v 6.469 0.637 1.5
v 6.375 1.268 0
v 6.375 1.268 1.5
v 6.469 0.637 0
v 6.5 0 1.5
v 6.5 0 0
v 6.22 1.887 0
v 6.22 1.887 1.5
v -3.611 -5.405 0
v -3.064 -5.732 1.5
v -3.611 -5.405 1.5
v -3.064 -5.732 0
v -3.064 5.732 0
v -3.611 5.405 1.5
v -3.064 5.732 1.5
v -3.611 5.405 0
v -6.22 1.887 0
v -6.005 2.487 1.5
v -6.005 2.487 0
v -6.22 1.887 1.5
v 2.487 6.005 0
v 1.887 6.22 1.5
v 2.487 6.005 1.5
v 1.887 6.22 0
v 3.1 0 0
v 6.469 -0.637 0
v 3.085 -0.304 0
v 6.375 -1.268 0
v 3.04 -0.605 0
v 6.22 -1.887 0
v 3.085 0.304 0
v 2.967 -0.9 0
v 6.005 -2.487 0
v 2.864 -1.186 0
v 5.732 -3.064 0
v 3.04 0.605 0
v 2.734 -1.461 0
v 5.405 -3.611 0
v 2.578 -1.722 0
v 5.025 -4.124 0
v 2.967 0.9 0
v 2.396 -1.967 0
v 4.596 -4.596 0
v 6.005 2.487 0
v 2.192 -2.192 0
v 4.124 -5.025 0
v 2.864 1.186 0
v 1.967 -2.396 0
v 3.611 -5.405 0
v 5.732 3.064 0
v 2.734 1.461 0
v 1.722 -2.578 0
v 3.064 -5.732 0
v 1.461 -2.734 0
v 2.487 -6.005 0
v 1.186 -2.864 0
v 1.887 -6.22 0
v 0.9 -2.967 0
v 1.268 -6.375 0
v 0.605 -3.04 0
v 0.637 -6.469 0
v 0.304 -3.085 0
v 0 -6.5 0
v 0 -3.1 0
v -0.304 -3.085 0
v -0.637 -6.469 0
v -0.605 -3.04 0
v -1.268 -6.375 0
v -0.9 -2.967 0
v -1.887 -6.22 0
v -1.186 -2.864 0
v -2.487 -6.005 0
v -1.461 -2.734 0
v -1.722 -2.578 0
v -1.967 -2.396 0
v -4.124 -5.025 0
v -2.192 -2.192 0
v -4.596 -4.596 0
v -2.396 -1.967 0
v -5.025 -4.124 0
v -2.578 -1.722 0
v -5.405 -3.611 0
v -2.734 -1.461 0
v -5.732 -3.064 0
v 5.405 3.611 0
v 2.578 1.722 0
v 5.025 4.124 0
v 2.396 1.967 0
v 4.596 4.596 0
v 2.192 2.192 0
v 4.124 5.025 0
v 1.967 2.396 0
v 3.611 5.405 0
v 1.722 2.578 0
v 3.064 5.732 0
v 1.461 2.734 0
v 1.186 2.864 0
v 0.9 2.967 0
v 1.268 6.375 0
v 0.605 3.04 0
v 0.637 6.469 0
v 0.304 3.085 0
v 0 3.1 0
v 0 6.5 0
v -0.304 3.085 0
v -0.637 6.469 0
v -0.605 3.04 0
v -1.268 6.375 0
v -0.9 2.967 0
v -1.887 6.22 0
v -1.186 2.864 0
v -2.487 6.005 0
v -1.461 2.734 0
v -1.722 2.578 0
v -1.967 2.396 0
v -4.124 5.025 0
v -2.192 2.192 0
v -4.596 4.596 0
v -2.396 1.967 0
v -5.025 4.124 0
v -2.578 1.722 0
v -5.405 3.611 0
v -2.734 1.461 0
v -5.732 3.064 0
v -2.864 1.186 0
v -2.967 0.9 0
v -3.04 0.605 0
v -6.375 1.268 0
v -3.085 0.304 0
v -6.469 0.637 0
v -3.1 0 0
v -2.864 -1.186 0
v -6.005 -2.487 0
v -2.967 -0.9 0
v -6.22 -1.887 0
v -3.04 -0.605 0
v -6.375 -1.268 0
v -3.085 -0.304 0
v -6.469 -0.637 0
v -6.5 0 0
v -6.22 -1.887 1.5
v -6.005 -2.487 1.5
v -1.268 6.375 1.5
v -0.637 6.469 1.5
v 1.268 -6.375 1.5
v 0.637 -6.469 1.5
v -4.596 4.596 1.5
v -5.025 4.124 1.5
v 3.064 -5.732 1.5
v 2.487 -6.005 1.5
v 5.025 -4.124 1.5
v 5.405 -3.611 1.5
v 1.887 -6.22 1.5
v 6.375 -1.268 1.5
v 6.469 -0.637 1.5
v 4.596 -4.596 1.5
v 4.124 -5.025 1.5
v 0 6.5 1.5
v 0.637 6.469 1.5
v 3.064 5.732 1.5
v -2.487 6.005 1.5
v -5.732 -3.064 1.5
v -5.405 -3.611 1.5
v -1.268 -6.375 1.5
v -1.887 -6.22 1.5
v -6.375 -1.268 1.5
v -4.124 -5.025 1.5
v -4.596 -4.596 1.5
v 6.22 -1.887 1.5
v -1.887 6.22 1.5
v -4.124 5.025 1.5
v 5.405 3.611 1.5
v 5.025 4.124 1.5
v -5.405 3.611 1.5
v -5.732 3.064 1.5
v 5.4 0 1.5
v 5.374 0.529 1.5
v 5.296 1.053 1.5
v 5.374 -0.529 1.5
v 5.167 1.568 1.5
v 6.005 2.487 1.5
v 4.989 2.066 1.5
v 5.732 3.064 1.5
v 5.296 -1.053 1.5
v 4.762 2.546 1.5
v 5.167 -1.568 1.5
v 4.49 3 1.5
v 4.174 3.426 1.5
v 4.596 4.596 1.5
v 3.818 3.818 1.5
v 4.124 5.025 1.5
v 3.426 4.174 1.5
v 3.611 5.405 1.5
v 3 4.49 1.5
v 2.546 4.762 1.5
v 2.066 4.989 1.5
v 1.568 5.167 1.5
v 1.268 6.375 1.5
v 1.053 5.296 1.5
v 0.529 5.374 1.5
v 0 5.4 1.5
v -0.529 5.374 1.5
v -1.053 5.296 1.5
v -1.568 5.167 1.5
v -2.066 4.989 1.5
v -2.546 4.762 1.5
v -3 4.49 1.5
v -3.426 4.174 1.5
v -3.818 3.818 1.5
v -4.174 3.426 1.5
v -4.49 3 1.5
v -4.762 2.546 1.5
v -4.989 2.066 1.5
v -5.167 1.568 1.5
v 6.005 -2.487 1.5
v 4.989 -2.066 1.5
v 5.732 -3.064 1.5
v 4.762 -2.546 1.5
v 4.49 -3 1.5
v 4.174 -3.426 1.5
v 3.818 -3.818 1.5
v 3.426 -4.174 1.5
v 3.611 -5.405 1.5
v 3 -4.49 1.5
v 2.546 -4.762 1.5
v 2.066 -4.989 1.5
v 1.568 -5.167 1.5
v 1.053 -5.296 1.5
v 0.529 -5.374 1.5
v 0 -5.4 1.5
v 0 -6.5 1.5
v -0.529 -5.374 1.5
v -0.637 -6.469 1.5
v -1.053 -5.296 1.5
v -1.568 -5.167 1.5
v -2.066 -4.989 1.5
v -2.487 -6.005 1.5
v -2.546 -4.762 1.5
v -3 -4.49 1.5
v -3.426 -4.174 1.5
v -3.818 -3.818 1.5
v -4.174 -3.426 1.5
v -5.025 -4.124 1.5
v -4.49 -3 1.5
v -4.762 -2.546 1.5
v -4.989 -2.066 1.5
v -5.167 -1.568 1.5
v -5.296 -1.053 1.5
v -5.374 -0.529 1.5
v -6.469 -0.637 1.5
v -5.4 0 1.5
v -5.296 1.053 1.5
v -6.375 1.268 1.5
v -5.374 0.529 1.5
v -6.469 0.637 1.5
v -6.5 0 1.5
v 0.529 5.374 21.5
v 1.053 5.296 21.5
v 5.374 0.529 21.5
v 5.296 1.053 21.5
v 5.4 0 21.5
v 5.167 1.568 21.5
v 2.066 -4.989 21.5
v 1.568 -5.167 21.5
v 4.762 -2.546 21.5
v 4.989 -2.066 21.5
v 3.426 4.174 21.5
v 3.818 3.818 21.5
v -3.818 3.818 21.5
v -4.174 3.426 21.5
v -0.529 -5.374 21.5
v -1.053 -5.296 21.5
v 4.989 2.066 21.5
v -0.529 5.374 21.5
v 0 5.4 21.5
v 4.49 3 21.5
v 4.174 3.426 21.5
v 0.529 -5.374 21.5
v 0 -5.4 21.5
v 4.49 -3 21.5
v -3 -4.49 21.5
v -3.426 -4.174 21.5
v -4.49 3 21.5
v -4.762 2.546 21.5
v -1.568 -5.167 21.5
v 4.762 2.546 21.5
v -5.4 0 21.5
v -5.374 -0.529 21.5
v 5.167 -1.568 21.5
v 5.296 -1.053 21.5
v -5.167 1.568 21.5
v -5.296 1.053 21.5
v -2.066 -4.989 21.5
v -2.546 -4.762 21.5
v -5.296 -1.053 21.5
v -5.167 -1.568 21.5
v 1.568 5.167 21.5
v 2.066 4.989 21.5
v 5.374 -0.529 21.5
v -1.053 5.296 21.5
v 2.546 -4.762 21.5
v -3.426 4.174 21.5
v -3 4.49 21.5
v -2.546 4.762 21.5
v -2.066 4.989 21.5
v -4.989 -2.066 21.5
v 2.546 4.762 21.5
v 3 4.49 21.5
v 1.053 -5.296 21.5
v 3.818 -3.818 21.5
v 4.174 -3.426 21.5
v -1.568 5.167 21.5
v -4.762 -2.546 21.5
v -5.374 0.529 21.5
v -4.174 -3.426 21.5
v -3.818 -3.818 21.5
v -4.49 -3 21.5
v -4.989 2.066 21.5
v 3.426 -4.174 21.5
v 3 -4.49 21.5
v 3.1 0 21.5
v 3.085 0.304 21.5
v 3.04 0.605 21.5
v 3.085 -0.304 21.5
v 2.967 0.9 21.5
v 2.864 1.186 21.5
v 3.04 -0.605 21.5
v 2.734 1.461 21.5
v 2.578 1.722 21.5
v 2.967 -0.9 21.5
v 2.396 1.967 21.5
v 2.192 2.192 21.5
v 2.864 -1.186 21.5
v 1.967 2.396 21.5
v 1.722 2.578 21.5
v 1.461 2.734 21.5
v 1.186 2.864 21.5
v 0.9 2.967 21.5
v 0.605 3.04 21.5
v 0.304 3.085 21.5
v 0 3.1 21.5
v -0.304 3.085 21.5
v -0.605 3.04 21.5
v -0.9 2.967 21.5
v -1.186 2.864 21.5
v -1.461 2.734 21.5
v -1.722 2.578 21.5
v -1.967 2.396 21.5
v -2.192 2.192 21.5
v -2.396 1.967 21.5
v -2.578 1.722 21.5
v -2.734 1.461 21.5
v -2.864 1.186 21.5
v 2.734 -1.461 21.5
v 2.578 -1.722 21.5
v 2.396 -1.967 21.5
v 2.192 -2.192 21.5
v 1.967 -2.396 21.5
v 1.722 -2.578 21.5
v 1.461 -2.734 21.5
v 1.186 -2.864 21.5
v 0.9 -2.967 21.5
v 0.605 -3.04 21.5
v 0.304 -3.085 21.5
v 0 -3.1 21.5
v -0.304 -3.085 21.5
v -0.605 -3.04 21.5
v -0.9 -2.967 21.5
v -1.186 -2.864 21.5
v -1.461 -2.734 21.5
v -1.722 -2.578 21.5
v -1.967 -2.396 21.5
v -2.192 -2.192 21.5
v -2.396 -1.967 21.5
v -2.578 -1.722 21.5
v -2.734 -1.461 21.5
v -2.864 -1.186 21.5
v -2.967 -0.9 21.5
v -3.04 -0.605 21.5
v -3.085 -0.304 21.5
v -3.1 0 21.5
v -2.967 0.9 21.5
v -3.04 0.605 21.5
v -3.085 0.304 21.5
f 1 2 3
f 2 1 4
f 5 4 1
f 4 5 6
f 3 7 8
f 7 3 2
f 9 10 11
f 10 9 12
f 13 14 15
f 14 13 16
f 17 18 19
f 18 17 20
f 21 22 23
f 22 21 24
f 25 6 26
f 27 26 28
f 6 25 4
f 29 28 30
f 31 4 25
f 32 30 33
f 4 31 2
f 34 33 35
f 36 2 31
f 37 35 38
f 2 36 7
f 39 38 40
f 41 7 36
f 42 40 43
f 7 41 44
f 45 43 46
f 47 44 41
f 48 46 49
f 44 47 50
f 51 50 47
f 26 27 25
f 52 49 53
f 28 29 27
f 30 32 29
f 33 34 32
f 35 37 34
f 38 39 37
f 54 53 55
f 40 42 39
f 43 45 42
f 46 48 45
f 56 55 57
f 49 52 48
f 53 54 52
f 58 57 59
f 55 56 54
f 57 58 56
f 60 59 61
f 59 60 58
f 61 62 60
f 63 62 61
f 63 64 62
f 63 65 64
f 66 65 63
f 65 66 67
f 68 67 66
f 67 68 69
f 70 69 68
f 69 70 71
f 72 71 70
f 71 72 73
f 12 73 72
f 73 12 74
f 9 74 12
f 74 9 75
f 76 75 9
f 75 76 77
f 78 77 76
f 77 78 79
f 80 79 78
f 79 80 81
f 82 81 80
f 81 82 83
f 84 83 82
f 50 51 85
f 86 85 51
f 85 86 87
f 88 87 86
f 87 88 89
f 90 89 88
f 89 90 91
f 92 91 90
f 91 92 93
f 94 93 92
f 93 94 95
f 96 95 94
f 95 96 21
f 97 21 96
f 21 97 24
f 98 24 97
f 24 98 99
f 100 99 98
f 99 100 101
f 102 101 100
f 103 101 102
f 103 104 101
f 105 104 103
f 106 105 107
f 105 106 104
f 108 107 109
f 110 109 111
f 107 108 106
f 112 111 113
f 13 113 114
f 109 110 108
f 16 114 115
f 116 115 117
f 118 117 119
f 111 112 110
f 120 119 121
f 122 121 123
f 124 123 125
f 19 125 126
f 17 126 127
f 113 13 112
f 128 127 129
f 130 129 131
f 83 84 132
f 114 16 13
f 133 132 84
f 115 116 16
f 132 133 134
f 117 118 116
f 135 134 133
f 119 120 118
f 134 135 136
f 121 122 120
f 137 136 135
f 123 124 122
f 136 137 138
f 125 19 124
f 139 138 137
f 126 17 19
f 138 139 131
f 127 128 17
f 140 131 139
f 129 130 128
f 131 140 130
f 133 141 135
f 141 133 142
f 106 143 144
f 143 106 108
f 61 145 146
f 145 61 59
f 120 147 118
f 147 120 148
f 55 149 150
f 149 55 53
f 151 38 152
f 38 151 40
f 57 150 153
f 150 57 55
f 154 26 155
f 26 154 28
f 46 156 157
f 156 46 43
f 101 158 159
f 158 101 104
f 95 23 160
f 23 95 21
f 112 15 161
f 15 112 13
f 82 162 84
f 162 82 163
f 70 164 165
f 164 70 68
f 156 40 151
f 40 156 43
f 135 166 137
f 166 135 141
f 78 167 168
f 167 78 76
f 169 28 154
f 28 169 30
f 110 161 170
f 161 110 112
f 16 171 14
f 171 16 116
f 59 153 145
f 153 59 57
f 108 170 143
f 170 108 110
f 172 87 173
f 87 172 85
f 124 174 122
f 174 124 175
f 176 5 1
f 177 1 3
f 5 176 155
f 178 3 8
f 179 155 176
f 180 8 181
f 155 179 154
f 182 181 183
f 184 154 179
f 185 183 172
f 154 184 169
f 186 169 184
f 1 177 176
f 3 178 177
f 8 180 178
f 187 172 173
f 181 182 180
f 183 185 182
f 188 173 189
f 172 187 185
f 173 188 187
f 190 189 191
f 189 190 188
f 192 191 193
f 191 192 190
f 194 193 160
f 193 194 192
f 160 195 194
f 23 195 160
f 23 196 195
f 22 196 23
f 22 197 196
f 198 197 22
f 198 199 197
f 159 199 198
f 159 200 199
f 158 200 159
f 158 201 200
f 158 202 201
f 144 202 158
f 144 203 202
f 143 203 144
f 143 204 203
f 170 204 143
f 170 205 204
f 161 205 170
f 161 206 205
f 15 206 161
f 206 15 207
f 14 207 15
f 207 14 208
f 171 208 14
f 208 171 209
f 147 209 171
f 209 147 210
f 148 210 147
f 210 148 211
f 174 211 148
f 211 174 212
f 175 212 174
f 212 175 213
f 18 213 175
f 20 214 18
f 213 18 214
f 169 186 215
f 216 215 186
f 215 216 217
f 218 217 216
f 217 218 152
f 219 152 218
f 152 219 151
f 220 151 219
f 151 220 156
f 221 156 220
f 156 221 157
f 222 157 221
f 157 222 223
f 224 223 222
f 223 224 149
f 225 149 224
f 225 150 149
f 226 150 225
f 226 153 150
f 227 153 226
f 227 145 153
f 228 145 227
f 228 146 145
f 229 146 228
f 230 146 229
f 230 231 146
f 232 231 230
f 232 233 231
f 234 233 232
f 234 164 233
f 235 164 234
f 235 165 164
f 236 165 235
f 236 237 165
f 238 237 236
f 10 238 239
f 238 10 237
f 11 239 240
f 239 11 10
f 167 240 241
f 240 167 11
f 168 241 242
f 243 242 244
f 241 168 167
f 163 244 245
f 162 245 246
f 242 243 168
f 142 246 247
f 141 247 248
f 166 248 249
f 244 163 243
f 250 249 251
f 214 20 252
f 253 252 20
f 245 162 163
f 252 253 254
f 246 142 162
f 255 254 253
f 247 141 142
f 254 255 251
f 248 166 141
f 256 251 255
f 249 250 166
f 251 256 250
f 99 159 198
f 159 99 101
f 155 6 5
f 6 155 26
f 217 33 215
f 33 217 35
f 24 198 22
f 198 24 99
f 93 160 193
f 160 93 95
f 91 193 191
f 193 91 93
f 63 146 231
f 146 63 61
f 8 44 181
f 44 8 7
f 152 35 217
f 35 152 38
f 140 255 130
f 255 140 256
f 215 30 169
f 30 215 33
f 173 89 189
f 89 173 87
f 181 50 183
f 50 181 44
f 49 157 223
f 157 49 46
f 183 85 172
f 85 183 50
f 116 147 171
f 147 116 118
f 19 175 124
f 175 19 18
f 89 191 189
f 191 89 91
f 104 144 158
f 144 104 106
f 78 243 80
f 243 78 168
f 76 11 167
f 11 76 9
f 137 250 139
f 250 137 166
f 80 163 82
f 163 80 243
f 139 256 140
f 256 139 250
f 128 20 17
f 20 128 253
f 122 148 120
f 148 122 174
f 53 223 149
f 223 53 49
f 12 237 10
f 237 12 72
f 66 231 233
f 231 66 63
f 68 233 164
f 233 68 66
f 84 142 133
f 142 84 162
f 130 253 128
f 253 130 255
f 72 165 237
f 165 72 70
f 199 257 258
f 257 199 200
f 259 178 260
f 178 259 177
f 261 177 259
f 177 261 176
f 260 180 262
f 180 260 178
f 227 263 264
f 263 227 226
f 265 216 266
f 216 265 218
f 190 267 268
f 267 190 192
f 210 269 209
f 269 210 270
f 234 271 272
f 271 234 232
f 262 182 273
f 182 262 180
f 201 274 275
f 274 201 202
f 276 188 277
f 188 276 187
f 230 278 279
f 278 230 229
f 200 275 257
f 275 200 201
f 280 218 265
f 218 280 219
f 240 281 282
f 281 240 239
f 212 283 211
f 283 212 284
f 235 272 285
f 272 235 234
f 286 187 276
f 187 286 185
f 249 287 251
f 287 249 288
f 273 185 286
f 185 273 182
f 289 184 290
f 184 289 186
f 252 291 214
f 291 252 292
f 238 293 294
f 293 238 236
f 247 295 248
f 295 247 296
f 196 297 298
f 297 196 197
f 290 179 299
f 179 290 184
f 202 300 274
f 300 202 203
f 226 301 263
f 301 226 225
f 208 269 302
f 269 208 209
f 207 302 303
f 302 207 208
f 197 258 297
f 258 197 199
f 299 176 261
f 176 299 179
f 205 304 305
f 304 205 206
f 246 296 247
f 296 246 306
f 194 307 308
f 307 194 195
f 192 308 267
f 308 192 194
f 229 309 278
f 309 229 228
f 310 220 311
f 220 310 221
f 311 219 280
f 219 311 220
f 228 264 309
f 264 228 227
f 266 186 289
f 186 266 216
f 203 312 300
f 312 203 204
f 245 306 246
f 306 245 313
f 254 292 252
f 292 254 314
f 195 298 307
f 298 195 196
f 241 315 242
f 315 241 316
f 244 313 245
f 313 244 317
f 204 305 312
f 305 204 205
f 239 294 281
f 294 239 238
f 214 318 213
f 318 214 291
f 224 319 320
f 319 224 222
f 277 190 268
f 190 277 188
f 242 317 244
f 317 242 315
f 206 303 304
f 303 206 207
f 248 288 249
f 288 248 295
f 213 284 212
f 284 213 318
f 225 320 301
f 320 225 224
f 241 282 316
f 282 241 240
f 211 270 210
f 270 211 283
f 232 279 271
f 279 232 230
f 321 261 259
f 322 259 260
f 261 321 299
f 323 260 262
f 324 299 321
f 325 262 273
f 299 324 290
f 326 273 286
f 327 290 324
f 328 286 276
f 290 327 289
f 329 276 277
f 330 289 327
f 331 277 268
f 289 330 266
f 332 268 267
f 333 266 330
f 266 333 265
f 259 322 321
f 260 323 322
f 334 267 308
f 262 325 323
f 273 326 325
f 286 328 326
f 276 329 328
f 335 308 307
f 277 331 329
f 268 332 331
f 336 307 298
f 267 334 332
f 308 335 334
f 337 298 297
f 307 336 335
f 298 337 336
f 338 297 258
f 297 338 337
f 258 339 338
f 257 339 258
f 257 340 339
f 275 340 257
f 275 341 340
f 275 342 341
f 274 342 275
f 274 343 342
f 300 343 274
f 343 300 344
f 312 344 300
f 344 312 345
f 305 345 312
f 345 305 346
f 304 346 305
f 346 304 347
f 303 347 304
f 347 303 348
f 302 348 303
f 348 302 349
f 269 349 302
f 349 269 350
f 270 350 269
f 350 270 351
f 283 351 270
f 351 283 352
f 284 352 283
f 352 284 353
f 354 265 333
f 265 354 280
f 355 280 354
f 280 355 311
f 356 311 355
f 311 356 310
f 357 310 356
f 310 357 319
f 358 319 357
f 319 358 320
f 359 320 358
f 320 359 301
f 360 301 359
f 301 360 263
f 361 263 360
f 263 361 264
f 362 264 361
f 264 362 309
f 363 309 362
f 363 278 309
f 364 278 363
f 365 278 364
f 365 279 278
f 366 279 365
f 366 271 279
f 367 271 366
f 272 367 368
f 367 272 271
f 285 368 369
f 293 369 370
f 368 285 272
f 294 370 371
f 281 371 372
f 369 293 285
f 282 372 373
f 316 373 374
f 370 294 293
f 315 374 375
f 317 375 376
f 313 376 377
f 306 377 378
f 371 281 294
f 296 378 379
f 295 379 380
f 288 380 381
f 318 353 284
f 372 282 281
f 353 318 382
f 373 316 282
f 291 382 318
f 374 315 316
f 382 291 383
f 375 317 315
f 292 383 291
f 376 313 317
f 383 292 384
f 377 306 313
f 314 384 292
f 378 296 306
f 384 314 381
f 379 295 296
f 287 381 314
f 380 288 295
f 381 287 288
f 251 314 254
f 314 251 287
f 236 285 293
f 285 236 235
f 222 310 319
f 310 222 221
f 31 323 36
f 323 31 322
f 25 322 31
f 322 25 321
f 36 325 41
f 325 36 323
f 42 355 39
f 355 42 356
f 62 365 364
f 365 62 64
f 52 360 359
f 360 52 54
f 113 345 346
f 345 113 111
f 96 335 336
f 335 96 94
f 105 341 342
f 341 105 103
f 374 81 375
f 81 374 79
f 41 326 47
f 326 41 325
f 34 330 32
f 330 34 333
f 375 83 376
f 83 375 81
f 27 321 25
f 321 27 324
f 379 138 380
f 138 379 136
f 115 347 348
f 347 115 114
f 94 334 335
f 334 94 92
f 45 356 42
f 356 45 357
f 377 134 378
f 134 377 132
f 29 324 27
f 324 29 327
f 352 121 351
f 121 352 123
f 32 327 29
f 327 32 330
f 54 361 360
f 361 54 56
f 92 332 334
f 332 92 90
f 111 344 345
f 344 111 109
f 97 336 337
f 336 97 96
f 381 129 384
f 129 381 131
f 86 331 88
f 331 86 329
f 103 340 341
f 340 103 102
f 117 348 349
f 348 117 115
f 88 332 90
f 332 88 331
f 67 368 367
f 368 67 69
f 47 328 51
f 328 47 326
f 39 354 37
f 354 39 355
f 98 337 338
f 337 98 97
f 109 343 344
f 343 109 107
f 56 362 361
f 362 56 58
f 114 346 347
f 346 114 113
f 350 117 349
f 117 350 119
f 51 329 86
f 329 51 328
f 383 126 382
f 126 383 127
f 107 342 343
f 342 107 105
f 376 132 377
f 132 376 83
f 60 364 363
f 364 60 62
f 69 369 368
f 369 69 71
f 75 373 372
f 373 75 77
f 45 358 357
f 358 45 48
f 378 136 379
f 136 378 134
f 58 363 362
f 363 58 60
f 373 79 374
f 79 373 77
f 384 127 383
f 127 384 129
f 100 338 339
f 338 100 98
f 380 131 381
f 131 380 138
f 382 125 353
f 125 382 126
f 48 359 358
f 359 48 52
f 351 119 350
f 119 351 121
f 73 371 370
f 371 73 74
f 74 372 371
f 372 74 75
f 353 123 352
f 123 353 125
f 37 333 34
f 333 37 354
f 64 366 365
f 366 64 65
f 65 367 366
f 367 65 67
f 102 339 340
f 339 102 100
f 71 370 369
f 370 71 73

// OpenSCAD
// Adapter sleeve: 0.2 mL PCR tube in a 1.5 mL rack hole
// Print orientation: collar on bed (z = 0), sleeve body rises to z = 21.5

$fn = 64;

// --- Dimensions (mm) ---
collar_d      = 13;    // collar outer diameter
collar_h      = 1.5;   // collar thickness (z = 0 to 1.5)
sleeve_od     = 10.8;  // sleeve body outer diameter
sleeve_top_z  = 21.5;  // top of sleeve body
bore_d        = 6.2;   // straight through-bore diameter
eps           = 0.5;   // cutter overshoot past faces

difference() {
    union() {
        // Collar
        cylinder(d = collar_d, h = collar_h);
        // Sleeve body (slightly overlapping collar for a clean union)
        translate([0, 0, collar_h - 0.01])
            cylinder(d = sleeve_od, h = sleeve_top_z - collar_h + 0.01);
    }
    // Full-height bore, open at both ends
    translate([0, 0, -eps])
        cylinder(d = bore_d, h = sleeve_top_z + 2 * eps);
}
